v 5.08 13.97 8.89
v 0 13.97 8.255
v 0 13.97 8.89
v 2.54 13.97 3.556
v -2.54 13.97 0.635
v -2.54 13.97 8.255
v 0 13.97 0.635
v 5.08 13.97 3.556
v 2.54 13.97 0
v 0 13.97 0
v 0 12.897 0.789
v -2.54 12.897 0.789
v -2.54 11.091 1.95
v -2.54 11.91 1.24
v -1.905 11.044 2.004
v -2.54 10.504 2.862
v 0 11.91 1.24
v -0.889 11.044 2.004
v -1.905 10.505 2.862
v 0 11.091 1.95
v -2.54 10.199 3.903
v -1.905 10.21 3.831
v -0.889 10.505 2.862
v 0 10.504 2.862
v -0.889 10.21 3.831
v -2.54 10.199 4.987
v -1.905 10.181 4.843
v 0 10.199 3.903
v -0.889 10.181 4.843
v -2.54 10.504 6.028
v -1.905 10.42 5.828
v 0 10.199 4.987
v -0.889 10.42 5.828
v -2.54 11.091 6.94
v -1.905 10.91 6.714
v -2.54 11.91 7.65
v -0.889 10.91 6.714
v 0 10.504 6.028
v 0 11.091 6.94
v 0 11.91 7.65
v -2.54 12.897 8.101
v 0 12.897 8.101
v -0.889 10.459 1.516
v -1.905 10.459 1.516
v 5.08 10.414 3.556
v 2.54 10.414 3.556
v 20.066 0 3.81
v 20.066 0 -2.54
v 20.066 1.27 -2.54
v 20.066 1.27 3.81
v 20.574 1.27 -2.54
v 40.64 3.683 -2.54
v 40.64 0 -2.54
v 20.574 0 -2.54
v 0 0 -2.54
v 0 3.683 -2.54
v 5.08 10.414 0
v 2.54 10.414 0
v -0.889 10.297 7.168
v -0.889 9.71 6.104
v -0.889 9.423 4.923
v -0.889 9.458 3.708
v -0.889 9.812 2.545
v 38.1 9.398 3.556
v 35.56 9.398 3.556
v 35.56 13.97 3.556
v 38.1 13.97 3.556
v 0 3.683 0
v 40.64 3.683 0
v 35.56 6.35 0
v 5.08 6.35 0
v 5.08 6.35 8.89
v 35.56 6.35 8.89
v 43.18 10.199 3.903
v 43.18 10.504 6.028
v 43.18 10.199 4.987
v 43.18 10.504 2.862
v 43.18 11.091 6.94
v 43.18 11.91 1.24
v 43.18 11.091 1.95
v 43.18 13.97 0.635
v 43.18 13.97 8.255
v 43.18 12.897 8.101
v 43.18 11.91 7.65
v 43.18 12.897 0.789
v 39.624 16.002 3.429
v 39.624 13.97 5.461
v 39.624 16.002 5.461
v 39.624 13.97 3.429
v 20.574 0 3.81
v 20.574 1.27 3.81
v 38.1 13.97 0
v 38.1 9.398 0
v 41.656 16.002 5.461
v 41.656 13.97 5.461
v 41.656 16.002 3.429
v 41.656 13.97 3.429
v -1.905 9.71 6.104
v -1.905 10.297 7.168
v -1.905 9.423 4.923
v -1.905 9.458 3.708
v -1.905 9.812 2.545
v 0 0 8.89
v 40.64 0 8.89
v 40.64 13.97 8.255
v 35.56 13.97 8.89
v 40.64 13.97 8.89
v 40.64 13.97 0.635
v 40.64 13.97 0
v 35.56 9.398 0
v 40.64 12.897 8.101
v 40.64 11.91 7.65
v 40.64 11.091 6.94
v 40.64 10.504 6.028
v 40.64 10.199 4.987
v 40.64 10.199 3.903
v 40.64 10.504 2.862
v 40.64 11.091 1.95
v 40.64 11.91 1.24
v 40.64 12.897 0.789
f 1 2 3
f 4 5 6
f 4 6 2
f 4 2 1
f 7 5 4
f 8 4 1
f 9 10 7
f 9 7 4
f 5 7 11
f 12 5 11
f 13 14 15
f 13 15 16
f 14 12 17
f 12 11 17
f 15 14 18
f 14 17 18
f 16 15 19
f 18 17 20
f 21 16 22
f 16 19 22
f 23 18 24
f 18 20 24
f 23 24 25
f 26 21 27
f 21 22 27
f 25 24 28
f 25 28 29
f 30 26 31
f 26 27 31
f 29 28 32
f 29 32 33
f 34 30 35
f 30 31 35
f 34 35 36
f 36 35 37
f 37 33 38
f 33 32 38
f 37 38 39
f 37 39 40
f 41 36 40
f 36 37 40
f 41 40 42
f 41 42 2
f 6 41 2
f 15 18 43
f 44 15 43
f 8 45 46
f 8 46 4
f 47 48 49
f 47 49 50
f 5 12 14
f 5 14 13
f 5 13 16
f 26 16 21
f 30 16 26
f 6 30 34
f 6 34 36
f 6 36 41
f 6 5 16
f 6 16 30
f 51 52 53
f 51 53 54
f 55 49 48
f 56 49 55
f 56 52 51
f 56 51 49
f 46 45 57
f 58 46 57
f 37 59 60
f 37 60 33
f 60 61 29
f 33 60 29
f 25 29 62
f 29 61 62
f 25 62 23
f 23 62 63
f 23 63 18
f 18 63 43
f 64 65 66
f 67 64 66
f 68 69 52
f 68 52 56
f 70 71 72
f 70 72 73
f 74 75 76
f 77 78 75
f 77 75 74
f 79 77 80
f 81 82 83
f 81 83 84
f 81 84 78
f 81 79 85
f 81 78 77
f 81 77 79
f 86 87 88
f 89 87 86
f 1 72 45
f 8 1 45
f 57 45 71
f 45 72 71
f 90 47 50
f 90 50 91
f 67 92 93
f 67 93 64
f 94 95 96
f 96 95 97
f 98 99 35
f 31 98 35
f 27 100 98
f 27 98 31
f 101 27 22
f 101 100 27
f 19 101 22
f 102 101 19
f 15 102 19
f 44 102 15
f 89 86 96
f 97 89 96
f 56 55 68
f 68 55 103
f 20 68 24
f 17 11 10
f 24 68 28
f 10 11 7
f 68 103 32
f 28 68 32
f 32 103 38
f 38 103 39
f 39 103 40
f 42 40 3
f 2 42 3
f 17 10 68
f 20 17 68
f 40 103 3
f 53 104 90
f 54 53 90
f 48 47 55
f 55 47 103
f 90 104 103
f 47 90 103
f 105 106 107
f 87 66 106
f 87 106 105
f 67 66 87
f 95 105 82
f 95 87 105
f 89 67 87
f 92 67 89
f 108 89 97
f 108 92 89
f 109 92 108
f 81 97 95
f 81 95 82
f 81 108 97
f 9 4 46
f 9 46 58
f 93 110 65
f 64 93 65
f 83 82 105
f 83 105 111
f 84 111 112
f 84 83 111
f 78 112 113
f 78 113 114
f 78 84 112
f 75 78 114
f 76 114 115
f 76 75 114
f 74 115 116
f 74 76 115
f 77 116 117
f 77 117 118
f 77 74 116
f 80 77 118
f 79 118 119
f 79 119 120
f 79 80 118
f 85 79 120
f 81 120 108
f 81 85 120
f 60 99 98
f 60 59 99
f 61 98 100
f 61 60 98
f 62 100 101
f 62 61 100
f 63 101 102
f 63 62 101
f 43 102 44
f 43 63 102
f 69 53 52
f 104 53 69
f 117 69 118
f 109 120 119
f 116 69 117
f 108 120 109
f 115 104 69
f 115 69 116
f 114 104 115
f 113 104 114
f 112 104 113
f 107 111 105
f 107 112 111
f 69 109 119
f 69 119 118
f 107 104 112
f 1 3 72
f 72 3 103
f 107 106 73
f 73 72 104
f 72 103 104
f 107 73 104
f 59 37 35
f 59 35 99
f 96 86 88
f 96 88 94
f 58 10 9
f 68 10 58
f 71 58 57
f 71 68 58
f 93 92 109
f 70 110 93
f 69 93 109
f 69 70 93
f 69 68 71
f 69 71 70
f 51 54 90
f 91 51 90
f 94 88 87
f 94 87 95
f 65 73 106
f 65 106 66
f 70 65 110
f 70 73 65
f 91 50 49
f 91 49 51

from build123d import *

# Parameters (mm, degrees)
SKETCH1_W           = 40.64
SKETCH1_H           = 6.35
BOSS_EXTRUDE1_DEPTH = 8.89
SKETCH2_W           = 5.08
SKETCH2_H           = 8.89
BOSS_EXTRUDE2_DEPTH = 7.62
SKETCH3_W           = 5.08
SKETCH3_H           = 8.89
BOSS_EXTRUDE3_DEPTH = 7.62
SKETCH4_W           = 3.556
SKETCH4_H           = 3.556
CUT_EXTRUDE1_DEPTH  = 2.54
BOSS_EXTRUDE4_DEPTH = 2.54
SKETCH6_W           = 40.64
SKETCH6_H           = 3.683
BOSS_EXTRUDE5_DEPTH = 2.54
SKETCH7_W           = 3.556
SKETCH7_H           = 4.572
CUT_EXTRUDE2_DEPTH  = 2.54
BOSS_EXTRUDE6_START = 2.54
BOSS_EXTRUDE6_DEPTH = 2.54
WRAP2_SECTION_W     = 0.762
WRAP2_SECTION_H     = 1.016
WRAP2_ANGLE         = 76.394372684
SKETCH11_W          = 0.508
SKETCH11_H          = 6.35
CUT_EXTRUDE3_DEPTH  = 1.27
SKETCH12_W          = 2.032
SKETCH12_H          = 2.032
BOSS_EXTRUDE7_DEPTH = 2.032


with BuildPart() as part:
    # Sketch1 → Boss-Extrude1 (new body)
    with BuildSketch(Plane.XY):
        with Locations((20.32, 3.175)):
            Rectangle(SKETCH1_W, SKETCH1_H)
    extrude(amount=BOSS_EXTRUDE1_DEPTH)

    # Sketch2 → Boss-Extrude2 (add)
    with BuildSketch(Plane(origin=(0, 6.35, 0), x_dir=(1, 0, 0), z_dir=(0, 1, 0))):
        with Locations((2.54, -4.445)):
            Rectangle(SKETCH2_W, SKETCH2_H)
    extrude(amount=BOSS_EXTRUDE2_DEPTH)

    # Sketch3 → Boss-Extrude3 (add)
    with BuildSketch(Plane(origin=(0, 6.35, 0), x_dir=(1, 0, 0), z_dir=(0, 1, 0))):
        with Locations((38.1, -4.445)):
            Rectangle(SKETCH3_W, SKETCH3_H)
    extrude(amount=BOSS_EXTRUDE3_DEPTH)

    # Sketch4 → Cut-Extrude1 (cut)
    with BuildSketch(Plane(origin=(5.08, 0, 0), x_dir=(0, 0, -1), z_dir=(1, 0, 0))):
        with Locations((-1.778, 12.192)):
            Rectangle(SKETCH4_W, SKETCH4_H)
    extrude(amount=-CUT_EXTRUDE1_DEPTH, mode=Mode.SUBTRACT)

    # Sketch5 → Boss-Extrude4 (add)
    with BuildSketch(Plane.ZY):
        with BuildLine():
            Line((8.255, 13.97), (0.635, 13.97))
            ThreePointArc((0.635, 13.97), (4.445, 10.16), (8.255, 13.97))
        make_face()
    extrude(amount=BOSS_EXTRUDE4_DEPTH)

    # Sketch6 → Boss-Extrude5 (add)
    with BuildSketch(Plane(origin=(0, 0, 0), x_dir=(-1, 0, 0), z_dir=(0, 0, -1))):
        with Locations((-20.32, 1.8415)):
            Rectangle(SKETCH6_W, SKETCH6_H)
    extrude(amount=BOSS_EXTRUDE5_DEPTH)

    # Sketch7 → Cut-Extrude2 (cut)
    with BuildSketch(Plane.ZY.offset(-35.56)):
        with Locations((1.778, 11.684)):
            Rectangle(SKETCH7_W, SKETCH7_H)
    extrude(amount=-CUT_EXTRUDE2_DEPTH, mode=Mode.SUBTRACT)

    # Sketch8 → Boss-Extrude6 (add)
    with BuildSketch(Plane(origin=(40.64, 0, 0), x_dir=(0, 0, -1), z_dir=(1, 0, 0)).offset(BOSS_EXTRUDE6_START)):
        with BuildLine():
            Line((-0.635, 13.97), (-8.255, 13.97))
            ThreePointArc((-8.255, 13.97), (-4.445, 10.16), (-0.635, 13.97))
        make_face()
    extrude(amount=-BOSS_EXTRUDE6_DEPTH)

    # Wrap2 section (on wrap section) → Wrap2 (revolve)
    with BuildSketch(Plane(origin=(0, 13.97, 4.445), x_dir=(0, -0.8032608103480625, 0.5956274595407551), z_dir=(0, 0.5956274595407551, 0.8032608103480625))):
        with Locations((4.191, -1.397)):
            Rectangle(WRAP2_SECTION_W, WRAP2_SECTION_H)
    revolve(axis=Axis((0, 13.97, 4.445), (1, 0, 0)), revolution_arc=WRAP2_ANGLE)

    # Sketch11 → Cut-Extrude3 (cut)
    with BuildSketch(Plane.XZ):
        with Locations((20.32, 0.635)):
            Rectangle(SKETCH11_W, SKETCH11_H)
    extrude(amount=-CUT_EXTRUDE3_DEPTH, mode=Mode.SUBTRACT)

    # Sketch12 → Boss-Extrude7 (add)
    with BuildSketch(Plane(origin=(0, 13.97, 0), x_dir=(1, 0, 0), z_dir=(0, 1, 0))):
        with Locations((40.64, -4.445)):
            Rectangle(SKETCH12_W, SKETCH12_H)
    extrude(amount=BOSS_EXTRUDE7_DEPTH)


solid = part.part
